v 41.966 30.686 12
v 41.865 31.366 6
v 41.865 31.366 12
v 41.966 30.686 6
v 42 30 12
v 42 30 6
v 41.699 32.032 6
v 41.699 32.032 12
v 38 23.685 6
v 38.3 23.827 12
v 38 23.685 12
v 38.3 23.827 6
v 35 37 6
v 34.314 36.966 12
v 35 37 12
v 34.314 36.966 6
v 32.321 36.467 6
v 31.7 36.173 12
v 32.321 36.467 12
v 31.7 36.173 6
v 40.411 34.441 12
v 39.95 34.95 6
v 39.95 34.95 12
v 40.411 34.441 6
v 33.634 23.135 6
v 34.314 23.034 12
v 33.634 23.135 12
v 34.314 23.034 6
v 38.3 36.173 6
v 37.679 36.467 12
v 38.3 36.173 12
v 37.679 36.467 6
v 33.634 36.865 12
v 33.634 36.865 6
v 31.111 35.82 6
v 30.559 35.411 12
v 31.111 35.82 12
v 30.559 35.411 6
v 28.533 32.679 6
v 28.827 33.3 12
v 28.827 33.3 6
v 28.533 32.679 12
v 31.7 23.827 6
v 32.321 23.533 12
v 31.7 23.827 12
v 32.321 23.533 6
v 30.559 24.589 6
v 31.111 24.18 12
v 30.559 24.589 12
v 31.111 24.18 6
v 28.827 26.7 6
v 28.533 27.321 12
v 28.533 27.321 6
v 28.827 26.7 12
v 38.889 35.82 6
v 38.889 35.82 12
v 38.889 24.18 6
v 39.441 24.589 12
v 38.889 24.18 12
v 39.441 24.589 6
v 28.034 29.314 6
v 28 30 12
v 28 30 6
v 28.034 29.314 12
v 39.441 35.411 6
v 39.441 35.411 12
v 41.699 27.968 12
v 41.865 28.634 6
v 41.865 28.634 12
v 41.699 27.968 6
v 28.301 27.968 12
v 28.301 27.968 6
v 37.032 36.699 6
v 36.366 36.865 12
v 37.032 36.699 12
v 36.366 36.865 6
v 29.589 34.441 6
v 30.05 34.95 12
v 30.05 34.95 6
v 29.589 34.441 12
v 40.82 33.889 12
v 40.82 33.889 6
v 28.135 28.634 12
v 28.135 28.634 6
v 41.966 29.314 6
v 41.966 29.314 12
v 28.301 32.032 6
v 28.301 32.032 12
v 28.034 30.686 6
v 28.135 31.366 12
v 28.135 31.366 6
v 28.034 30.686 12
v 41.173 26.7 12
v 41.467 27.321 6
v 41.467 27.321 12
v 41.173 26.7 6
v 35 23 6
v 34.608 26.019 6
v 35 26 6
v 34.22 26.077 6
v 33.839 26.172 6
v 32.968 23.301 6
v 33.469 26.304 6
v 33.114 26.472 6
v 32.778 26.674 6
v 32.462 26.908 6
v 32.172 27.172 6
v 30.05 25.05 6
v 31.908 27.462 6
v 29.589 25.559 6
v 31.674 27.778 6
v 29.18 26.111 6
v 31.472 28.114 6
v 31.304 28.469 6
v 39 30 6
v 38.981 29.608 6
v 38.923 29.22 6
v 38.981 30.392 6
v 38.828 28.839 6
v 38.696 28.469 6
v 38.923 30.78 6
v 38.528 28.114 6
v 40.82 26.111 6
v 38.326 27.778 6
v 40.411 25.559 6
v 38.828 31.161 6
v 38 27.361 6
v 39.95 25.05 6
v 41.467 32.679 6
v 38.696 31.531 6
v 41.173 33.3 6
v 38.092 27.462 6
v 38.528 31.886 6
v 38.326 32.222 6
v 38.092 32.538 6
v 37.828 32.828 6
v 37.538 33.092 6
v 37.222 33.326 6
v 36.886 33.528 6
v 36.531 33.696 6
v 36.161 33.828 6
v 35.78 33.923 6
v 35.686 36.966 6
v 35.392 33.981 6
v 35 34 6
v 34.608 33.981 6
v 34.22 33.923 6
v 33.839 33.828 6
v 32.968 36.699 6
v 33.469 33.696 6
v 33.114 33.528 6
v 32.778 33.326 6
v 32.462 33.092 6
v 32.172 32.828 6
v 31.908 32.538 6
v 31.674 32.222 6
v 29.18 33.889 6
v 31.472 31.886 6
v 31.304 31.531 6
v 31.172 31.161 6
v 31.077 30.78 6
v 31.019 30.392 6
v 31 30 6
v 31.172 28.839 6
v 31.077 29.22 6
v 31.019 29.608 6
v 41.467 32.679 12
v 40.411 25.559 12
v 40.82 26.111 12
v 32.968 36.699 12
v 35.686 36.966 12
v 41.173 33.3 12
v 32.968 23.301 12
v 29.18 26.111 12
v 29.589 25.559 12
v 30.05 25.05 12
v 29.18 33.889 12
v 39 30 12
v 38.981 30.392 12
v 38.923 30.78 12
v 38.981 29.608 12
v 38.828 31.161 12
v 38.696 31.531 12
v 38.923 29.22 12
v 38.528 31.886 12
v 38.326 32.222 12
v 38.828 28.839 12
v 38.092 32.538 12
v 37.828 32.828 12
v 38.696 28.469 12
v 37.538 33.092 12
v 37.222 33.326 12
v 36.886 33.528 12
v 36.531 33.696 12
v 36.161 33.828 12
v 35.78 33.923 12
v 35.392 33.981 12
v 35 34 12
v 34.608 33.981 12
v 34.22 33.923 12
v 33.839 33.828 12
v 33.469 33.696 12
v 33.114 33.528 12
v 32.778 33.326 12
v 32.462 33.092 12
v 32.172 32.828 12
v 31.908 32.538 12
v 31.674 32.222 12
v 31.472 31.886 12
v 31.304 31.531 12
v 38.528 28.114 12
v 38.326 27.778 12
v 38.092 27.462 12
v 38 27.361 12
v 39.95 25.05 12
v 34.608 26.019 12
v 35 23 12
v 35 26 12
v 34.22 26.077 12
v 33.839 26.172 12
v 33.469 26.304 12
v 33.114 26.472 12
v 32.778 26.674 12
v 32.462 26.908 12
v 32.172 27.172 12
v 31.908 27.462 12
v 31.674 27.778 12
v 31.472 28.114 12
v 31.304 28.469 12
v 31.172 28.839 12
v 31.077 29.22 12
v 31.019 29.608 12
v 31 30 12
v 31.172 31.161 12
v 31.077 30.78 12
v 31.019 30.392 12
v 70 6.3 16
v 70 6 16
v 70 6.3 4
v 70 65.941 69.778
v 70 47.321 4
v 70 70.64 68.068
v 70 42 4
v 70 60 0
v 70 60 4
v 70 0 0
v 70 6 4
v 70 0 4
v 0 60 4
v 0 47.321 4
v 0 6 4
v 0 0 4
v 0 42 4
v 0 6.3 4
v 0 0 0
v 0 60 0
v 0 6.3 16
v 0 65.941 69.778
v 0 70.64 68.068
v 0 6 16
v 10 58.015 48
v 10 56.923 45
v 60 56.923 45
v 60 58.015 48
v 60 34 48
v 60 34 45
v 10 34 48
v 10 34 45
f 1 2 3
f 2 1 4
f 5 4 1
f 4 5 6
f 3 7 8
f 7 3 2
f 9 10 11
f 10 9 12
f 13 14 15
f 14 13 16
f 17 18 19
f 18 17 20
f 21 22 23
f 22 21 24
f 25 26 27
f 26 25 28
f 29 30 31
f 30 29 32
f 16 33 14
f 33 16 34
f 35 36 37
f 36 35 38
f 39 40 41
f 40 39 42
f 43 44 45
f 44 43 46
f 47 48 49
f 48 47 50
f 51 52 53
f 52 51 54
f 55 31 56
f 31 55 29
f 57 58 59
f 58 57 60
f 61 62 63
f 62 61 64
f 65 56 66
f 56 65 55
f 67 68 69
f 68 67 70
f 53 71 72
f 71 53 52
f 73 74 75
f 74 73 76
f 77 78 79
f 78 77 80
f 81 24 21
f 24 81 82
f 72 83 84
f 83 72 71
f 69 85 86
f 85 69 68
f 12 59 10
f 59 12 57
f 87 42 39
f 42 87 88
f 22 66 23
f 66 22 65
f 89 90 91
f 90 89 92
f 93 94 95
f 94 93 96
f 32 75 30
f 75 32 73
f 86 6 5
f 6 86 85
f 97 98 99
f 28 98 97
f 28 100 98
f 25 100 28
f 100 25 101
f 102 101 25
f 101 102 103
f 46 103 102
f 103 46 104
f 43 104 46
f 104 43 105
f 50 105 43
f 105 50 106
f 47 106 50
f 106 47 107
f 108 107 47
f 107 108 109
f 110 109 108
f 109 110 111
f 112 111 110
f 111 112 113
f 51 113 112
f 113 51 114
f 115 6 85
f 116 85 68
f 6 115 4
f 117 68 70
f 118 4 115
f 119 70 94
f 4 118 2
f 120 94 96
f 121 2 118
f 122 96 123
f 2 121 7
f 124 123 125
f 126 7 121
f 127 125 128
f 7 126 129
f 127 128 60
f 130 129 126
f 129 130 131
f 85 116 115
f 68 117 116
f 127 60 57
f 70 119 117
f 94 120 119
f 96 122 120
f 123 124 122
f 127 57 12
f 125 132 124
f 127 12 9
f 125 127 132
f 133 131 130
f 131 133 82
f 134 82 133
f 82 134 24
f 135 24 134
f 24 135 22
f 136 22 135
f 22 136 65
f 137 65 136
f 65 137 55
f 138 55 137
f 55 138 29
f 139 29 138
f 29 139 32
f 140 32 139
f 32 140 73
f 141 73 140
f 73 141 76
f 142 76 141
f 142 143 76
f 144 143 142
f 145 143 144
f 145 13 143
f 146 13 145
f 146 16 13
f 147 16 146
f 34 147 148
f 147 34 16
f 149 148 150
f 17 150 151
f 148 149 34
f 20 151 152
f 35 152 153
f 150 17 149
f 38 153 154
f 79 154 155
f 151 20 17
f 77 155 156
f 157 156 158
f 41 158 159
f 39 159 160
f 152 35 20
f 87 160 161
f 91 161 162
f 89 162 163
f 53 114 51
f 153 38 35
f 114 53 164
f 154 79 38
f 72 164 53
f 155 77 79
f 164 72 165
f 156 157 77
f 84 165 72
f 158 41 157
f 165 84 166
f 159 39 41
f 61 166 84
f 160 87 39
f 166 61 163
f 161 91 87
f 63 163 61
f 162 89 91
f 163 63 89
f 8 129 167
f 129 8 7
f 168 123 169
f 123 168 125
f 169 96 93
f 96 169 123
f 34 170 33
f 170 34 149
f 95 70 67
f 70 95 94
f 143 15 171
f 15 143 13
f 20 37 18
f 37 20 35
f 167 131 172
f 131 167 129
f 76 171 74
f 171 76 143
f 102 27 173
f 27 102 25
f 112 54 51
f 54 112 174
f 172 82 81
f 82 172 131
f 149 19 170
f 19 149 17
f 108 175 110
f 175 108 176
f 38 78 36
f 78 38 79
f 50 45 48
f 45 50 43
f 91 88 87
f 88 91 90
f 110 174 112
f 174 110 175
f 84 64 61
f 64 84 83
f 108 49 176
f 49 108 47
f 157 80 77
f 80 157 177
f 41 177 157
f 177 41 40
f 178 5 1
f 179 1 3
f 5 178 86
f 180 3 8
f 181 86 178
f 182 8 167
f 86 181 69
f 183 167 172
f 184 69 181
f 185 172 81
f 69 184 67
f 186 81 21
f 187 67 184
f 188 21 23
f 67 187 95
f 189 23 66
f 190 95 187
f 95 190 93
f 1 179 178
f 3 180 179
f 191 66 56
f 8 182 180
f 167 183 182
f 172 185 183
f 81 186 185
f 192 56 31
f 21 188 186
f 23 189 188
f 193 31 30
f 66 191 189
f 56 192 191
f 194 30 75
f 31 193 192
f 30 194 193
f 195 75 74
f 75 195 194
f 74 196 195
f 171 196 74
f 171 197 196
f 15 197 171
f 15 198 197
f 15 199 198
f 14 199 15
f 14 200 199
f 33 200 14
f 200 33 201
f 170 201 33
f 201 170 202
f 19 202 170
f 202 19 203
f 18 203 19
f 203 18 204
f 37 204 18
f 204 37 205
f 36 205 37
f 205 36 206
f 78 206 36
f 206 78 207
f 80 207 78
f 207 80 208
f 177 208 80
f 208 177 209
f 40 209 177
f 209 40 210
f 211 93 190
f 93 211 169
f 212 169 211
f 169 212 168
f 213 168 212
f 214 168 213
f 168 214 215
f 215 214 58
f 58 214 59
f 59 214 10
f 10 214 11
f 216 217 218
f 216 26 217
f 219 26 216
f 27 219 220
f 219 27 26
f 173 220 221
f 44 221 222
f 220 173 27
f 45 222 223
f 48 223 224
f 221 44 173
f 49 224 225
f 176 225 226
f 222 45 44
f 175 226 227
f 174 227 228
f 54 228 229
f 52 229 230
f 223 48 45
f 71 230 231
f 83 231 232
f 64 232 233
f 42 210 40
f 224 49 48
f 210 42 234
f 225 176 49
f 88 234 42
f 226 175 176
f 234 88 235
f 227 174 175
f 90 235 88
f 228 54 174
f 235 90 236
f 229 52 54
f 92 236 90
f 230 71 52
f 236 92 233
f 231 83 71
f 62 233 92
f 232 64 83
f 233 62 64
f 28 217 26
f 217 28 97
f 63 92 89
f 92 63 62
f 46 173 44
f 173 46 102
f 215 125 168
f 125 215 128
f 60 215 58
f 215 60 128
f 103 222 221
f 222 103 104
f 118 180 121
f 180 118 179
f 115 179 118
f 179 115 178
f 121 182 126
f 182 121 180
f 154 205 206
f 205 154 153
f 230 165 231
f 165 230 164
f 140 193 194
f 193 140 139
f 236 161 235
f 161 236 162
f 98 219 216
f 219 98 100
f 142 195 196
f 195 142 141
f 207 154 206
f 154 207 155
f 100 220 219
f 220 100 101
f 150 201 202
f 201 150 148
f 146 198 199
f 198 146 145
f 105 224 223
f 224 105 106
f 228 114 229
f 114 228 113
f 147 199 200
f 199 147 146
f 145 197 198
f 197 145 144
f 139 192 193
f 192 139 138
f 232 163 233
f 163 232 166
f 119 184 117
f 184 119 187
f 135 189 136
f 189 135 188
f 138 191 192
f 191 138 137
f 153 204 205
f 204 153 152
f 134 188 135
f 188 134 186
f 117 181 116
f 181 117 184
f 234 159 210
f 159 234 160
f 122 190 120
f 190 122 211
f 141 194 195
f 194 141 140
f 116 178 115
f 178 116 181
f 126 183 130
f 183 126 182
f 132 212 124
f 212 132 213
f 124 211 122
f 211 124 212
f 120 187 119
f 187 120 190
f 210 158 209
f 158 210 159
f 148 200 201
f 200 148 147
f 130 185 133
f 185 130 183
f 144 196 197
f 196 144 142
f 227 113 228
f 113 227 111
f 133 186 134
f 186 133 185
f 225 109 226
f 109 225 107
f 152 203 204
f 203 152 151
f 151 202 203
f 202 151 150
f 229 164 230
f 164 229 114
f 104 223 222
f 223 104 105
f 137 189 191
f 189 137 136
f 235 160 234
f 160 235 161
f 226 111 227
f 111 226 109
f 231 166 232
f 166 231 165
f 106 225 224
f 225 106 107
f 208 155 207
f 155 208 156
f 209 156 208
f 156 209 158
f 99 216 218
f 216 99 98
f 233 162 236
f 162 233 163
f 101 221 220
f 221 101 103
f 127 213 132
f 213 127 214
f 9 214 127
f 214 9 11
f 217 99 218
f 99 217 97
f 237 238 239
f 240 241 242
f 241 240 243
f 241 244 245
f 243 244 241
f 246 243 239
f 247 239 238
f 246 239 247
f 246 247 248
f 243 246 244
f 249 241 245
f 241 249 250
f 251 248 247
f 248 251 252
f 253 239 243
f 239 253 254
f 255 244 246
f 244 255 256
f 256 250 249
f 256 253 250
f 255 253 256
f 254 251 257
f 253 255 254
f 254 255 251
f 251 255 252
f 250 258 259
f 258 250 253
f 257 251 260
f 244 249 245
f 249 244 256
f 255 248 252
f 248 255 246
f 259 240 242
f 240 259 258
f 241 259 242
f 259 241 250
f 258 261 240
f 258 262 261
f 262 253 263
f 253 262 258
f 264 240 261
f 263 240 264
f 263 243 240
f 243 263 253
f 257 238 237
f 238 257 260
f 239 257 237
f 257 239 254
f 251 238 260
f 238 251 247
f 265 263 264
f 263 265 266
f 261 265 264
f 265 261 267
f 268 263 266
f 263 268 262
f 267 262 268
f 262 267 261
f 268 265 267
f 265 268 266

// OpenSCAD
// A phone stand with three printing problems, for `neoscad check`:
// a lip wall thinner than the nozzle can print, a shelf that overhangs
// with nothing under it, and a cable clip that floats above the bed.

$fn = 64;

// Base plate.
cube([70, 60, 4]);

// Back rest, leaning back 20 degrees.
translate([0, 42, 4]) rotate([-20, 0, 0]) cube([70, 5, 70]);

// Front lip that holds the phone: 0.3 mm thick, below a 0.4 mm nozzle.
translate([0, 6, 4]) cube([70, 0.3, 12]);

// A shelf sticking straight out of the back rest, unsupported.
translate([10, 34, 45]) cube([50, 26, 3]);

// A cable clip modelled 2 mm above the plate: it would print in mid-air.
translate([35, 30, 6]) difference() {
    cylinder(h = 6, d = 14);
    translate([0, 0, -1]) cylinder(h = 8, d = 8);
    translate([0, -10, -1]) cube([3, 10, 8]);
}
